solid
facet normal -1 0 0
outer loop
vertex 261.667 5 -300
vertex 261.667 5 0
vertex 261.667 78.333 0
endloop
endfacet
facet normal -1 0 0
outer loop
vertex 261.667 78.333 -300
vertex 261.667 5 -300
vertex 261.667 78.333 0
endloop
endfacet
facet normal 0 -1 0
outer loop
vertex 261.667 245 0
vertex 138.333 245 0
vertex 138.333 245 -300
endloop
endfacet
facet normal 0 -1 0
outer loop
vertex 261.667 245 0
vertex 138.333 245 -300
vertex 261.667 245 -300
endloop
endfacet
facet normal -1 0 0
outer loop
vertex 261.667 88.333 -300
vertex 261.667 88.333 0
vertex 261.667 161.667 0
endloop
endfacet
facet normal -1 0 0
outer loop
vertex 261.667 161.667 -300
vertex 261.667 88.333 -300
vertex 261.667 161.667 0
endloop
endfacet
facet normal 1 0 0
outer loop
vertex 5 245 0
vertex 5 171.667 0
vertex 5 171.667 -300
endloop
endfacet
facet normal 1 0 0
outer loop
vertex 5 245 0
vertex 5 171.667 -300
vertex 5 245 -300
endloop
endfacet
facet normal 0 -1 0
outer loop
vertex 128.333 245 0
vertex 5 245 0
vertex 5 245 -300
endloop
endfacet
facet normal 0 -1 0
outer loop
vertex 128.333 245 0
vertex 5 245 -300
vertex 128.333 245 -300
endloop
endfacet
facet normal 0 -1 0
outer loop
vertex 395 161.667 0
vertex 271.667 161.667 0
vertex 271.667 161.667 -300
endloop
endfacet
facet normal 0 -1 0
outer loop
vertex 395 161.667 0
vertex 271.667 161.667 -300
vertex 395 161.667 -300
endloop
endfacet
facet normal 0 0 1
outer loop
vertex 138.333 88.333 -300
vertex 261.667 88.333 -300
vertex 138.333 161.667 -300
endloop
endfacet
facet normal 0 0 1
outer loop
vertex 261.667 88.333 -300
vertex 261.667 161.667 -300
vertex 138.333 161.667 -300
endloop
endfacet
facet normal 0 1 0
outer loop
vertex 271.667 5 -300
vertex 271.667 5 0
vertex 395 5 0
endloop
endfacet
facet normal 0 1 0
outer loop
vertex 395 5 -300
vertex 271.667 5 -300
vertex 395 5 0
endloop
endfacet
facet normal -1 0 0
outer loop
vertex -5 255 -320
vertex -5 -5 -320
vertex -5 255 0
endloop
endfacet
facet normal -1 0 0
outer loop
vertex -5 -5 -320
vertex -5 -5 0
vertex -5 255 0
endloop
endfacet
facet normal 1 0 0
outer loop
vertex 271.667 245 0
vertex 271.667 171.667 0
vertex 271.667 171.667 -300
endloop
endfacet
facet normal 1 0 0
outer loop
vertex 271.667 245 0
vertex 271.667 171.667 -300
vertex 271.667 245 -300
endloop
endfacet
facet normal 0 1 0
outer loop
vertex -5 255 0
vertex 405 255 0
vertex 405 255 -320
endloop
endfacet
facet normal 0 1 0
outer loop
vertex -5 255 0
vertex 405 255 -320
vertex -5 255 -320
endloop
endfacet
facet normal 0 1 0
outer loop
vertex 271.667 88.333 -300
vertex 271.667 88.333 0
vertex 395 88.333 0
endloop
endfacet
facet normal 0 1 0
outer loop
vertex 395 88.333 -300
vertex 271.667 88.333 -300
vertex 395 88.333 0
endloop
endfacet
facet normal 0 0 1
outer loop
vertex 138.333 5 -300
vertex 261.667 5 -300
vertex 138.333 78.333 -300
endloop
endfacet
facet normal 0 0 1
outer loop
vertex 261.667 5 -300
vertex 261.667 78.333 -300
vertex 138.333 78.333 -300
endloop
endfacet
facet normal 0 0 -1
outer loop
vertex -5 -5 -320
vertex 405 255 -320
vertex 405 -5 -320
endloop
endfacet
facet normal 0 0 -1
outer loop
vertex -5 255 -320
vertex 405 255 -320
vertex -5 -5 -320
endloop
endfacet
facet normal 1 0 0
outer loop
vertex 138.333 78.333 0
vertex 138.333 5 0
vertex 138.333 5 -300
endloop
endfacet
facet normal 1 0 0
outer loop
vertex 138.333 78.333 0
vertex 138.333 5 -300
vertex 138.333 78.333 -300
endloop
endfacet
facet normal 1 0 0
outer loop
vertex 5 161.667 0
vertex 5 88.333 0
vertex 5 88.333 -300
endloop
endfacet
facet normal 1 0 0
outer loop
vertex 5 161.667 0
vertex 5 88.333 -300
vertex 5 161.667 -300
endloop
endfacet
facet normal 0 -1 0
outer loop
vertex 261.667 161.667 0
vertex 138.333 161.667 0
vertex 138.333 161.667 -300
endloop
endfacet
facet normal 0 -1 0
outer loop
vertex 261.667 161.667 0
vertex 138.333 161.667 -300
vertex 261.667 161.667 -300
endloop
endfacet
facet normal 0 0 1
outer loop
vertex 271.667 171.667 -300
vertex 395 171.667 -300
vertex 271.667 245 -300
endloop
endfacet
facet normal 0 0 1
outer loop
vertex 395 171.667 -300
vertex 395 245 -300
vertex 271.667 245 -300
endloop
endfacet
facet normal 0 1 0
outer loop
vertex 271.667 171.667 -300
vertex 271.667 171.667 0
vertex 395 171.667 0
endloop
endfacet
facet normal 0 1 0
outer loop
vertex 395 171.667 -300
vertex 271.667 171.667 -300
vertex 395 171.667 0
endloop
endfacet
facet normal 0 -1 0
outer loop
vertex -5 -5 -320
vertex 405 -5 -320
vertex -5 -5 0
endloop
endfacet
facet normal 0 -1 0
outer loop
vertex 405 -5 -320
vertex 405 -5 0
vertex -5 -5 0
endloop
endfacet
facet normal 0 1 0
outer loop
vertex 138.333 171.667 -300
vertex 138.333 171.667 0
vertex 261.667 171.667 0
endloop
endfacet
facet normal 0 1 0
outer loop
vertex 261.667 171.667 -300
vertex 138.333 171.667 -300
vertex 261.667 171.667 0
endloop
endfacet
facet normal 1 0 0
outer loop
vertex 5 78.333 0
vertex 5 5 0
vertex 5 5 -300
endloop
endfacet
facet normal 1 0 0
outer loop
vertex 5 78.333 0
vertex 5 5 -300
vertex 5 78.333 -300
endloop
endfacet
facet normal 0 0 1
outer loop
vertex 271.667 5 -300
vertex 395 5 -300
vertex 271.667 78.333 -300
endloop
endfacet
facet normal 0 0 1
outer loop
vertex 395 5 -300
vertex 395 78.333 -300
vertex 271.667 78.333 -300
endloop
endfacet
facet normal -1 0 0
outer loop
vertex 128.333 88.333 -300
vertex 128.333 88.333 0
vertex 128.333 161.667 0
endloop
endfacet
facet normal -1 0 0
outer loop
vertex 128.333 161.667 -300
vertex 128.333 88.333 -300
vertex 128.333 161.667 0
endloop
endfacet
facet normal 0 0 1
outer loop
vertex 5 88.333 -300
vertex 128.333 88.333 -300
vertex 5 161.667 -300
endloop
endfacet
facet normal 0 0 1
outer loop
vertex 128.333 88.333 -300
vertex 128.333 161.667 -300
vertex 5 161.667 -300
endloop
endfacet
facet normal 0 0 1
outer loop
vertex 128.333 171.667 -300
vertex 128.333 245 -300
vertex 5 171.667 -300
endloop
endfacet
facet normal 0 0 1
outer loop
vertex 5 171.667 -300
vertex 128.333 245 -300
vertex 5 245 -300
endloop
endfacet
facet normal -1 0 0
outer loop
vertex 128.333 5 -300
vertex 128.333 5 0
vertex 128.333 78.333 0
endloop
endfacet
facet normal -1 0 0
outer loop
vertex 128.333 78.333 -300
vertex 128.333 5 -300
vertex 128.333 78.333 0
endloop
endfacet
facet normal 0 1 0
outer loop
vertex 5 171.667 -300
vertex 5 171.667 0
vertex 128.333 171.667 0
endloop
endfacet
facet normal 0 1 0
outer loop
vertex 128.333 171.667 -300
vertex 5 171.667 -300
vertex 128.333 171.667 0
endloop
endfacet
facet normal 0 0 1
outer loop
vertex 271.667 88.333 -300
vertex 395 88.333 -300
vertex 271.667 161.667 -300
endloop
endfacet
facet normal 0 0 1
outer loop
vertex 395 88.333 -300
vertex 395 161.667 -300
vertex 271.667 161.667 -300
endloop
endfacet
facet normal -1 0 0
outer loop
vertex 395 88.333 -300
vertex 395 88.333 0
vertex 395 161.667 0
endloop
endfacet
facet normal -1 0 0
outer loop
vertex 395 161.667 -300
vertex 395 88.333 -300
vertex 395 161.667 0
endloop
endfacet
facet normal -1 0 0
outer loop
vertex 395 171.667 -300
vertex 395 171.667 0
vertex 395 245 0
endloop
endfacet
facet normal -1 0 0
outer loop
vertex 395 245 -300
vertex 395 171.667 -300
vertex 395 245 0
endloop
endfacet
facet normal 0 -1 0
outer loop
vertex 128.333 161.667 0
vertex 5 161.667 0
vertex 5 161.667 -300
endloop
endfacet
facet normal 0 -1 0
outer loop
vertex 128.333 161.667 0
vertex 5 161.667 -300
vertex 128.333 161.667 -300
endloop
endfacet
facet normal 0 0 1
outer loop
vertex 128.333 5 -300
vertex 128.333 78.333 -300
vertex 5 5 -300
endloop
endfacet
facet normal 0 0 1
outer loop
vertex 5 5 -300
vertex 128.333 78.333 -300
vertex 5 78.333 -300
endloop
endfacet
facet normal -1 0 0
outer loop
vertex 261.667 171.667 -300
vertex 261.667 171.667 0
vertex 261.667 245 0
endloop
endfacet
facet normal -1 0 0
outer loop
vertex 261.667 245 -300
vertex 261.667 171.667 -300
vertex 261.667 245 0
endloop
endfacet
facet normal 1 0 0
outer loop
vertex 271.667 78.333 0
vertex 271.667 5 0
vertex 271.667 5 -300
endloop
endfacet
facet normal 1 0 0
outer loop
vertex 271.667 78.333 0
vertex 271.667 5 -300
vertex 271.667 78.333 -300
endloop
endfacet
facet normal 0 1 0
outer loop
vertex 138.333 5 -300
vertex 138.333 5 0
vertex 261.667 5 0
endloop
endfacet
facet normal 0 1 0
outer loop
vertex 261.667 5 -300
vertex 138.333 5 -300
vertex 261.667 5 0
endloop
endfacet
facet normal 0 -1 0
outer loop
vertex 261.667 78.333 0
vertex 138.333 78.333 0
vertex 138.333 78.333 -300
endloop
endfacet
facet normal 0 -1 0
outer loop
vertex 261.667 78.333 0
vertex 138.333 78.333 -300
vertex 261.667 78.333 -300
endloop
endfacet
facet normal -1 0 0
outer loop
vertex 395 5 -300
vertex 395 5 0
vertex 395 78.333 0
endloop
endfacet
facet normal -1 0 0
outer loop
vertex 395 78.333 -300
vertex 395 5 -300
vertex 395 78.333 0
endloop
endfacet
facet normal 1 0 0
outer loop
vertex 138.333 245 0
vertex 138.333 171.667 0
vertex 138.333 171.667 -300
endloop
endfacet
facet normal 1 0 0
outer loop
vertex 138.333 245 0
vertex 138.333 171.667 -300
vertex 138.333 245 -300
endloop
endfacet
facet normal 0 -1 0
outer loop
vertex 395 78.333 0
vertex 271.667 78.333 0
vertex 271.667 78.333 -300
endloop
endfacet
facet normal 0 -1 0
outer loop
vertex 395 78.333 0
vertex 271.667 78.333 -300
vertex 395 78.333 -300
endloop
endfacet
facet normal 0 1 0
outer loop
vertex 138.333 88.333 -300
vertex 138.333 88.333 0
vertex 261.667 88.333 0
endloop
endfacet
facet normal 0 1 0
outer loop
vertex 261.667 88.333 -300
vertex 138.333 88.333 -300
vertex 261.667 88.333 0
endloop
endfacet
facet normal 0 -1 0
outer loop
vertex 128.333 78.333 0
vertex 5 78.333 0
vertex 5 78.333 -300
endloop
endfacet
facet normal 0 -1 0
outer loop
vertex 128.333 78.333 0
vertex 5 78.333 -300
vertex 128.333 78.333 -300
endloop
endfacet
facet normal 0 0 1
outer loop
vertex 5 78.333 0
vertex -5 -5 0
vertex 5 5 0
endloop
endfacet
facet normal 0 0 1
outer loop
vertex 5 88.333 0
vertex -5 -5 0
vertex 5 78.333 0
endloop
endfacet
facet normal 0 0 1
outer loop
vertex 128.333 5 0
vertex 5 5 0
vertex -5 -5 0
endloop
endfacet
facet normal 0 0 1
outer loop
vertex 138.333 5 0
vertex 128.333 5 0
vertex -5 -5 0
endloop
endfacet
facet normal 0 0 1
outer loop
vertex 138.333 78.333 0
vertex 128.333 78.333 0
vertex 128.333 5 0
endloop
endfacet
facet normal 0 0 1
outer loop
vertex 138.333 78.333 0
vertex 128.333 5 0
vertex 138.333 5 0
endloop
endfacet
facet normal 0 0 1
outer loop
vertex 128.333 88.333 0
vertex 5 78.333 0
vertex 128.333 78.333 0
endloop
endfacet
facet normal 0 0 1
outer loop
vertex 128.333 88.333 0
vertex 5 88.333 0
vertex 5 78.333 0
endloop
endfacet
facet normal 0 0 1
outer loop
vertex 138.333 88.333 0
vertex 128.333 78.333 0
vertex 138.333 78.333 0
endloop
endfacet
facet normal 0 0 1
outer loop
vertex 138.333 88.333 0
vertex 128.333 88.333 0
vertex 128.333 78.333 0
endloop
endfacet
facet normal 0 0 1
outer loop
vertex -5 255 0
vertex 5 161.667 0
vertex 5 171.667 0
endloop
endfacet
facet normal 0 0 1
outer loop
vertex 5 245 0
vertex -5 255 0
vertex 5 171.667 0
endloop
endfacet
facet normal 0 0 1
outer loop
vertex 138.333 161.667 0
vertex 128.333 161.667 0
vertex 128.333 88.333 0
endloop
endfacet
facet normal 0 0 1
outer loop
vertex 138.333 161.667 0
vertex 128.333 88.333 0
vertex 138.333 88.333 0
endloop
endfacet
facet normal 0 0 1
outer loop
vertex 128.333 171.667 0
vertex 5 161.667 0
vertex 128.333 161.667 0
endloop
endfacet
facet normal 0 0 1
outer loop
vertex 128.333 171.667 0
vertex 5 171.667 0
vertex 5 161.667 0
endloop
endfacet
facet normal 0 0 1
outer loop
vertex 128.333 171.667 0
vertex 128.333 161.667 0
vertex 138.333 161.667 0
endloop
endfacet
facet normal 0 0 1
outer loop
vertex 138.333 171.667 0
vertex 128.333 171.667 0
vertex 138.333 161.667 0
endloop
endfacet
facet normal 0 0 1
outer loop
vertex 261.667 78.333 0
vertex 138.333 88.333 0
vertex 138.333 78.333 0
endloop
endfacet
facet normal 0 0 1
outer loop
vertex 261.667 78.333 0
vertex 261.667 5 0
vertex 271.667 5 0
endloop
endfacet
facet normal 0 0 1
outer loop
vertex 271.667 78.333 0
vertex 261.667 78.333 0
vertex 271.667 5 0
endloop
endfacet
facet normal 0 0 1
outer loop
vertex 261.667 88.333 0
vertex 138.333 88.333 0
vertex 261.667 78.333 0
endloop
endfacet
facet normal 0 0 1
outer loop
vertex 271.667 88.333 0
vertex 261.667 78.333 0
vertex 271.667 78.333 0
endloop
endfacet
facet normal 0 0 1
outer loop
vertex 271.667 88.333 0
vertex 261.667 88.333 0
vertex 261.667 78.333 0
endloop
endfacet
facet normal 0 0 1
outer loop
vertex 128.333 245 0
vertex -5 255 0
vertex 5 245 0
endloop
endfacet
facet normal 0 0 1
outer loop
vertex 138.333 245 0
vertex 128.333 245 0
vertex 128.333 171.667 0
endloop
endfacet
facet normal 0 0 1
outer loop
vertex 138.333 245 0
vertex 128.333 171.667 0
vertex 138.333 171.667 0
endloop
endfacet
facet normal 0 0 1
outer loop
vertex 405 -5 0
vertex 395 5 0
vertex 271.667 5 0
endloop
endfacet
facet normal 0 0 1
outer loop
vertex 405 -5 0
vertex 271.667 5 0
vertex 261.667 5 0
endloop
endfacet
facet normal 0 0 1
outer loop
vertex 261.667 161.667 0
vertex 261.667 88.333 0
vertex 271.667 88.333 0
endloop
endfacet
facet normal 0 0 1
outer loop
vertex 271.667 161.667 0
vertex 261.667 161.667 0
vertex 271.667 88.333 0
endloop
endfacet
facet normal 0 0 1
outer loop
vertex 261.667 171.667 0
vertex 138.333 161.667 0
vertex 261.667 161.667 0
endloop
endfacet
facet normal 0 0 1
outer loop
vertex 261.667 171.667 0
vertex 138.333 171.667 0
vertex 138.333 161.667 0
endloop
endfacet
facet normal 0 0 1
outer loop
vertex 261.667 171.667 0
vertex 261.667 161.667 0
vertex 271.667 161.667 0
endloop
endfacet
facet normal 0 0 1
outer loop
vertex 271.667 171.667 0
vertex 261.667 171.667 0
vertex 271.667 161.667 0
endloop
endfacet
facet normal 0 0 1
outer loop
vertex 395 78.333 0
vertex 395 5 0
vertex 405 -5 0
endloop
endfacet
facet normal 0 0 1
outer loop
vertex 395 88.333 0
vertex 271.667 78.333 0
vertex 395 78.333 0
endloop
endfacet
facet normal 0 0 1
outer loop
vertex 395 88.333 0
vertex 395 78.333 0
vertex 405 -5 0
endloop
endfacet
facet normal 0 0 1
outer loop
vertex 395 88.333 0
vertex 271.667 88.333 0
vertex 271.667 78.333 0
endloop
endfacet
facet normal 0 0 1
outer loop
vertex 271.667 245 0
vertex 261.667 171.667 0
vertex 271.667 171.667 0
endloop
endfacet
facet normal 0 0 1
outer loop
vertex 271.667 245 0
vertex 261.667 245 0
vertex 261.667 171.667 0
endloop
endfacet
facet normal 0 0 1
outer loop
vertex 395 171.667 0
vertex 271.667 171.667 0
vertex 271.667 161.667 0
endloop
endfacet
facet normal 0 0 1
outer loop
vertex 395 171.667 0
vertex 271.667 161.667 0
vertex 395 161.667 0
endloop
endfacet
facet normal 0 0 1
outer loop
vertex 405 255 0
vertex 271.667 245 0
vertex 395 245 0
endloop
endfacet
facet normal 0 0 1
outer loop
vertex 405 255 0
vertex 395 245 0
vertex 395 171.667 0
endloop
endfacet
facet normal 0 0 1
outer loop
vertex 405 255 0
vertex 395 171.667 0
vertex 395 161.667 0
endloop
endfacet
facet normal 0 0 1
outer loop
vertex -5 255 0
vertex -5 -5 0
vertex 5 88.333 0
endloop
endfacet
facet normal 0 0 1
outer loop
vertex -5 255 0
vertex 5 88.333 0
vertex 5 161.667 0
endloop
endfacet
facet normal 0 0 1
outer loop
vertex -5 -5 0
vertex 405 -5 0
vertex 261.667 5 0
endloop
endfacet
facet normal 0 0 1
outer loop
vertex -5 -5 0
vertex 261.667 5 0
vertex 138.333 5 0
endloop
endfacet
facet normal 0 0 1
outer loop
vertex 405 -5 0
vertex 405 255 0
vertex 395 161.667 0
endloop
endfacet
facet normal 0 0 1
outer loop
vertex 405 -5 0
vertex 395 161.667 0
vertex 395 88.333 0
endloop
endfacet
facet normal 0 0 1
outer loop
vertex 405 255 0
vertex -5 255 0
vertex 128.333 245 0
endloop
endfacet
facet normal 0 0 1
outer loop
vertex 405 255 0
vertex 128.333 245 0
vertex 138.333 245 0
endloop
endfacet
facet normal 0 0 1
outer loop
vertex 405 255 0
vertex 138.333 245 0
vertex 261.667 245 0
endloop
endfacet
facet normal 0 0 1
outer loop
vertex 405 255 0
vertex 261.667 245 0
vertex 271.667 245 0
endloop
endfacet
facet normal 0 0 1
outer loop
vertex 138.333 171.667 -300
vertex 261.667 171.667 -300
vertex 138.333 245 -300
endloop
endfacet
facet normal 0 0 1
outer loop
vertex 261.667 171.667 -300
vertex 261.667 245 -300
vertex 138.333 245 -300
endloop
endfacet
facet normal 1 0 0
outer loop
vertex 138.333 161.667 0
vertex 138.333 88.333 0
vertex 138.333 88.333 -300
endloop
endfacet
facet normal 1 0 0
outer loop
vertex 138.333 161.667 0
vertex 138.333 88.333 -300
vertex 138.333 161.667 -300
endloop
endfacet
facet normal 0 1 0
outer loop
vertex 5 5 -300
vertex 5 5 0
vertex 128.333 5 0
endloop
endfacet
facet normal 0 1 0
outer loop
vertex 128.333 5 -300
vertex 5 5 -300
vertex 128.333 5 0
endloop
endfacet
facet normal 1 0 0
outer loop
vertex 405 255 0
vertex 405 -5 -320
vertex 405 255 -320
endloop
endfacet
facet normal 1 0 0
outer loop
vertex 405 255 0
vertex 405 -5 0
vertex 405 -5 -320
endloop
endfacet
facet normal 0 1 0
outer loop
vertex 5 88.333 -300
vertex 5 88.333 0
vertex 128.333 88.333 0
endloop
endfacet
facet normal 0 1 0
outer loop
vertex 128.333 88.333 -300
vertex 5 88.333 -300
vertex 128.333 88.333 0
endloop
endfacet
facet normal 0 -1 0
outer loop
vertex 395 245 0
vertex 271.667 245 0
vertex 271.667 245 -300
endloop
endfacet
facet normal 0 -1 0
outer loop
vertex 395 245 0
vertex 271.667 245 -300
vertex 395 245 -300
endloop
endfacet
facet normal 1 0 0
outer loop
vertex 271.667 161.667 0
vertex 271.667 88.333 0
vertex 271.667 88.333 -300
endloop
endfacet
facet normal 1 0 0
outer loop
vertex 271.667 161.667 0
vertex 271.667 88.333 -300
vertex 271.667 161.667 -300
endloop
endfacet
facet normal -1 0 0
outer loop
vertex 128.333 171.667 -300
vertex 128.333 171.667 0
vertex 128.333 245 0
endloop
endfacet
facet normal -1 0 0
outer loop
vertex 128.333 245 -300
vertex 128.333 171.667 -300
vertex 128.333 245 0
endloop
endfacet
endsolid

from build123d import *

# Parameters (mm, degrees)
CROQUIS1_W              = 410
CROQUIS1_H              = 260
CROQUIS1_W_2            = 123.333333333
CROQUIS1_H_2            = 73.333333333
CROQUIS1_W_3            = 123.333333334
CROQUIS1_H_3            = 73.333333334
SALIENTE_EXTRUIR3_DEPTH = 300
CROQUIS4_W              = 410
CROQUIS4_H              = 260
SALIENTE_EXTRUIR4_DEPTH = 20


with BuildPart() as part:
    # Croquis1 → Saliente-Extruir3 (new body)
    with BuildSketch(Plane.XY):
        with Locations((200, 125)):
            Rectangle(CROQUIS1_W, CROQUIS1_H)
        with Locations((66.666666667, 41.666666666)):
            Rectangle(CROQUIS1_W_2, CROQUIS1_H_2, mode=Mode.SUBTRACT)
        with Locations((200, 41.666666666)):
            Rectangle(CROQUIS1_W_3, CROQUIS1_H_2, mode=Mode.SUBTRACT)
        with Locations((333.333333334, 125)):
            Rectangle(CROQUIS1_W_2, CROQUIS1_H_3, mode=Mode.SUBTRACT)
        with Locations((333.333333334, 41.666666666)):
            Rectangle(CROQUIS1_W_2, CROQUIS1_H_2, mode=Mode.SUBTRACT)
        with Locations((66.666666667, 125)):
            Rectangle(CROQUIS1_W_2, CROQUIS1_H_3, mode=Mode.SUBTRACT)
        with Locations((66.666666667, 208.333333334)):
            Rectangle(CROQUIS1_W_2, CROQUIS1_H_2, mode=Mode.SUBTRACT)
        with Locations((200, 125)):
            Rectangle(CROQUIS1_W_3, CROQUIS1_H_3, mode=Mode.SUBTRACT)
        with Locations((200, 208.333333334)):
            Rectangle(CROQUIS1_W_3, CROQUIS1_H_2, mode=Mode.SUBTRACT)
        with Locations((333.333333334, 208.333333334)):
            Rectangle(CROQUIS1_W_2, CROQUIS1_H_2, mode=Mode.SUBTRACT)
    extrude(amount=-SALIENTE_EXTRUIR3_DEPTH)

    # Croquis4 → Saliente-Extruir4 (add)
    with BuildSketch(Plane(origin=(0, 0, -300), x_dir=(-1, 0, 0), z_dir=(0, 0, -1))):
        with Locations((-200, 125)):
            Rectangle(CROQUIS4_W, CROQUIS4_H)
    extrude(amount=SALIENTE_EXTRUIR4_DEPTH)


solid = part.part
